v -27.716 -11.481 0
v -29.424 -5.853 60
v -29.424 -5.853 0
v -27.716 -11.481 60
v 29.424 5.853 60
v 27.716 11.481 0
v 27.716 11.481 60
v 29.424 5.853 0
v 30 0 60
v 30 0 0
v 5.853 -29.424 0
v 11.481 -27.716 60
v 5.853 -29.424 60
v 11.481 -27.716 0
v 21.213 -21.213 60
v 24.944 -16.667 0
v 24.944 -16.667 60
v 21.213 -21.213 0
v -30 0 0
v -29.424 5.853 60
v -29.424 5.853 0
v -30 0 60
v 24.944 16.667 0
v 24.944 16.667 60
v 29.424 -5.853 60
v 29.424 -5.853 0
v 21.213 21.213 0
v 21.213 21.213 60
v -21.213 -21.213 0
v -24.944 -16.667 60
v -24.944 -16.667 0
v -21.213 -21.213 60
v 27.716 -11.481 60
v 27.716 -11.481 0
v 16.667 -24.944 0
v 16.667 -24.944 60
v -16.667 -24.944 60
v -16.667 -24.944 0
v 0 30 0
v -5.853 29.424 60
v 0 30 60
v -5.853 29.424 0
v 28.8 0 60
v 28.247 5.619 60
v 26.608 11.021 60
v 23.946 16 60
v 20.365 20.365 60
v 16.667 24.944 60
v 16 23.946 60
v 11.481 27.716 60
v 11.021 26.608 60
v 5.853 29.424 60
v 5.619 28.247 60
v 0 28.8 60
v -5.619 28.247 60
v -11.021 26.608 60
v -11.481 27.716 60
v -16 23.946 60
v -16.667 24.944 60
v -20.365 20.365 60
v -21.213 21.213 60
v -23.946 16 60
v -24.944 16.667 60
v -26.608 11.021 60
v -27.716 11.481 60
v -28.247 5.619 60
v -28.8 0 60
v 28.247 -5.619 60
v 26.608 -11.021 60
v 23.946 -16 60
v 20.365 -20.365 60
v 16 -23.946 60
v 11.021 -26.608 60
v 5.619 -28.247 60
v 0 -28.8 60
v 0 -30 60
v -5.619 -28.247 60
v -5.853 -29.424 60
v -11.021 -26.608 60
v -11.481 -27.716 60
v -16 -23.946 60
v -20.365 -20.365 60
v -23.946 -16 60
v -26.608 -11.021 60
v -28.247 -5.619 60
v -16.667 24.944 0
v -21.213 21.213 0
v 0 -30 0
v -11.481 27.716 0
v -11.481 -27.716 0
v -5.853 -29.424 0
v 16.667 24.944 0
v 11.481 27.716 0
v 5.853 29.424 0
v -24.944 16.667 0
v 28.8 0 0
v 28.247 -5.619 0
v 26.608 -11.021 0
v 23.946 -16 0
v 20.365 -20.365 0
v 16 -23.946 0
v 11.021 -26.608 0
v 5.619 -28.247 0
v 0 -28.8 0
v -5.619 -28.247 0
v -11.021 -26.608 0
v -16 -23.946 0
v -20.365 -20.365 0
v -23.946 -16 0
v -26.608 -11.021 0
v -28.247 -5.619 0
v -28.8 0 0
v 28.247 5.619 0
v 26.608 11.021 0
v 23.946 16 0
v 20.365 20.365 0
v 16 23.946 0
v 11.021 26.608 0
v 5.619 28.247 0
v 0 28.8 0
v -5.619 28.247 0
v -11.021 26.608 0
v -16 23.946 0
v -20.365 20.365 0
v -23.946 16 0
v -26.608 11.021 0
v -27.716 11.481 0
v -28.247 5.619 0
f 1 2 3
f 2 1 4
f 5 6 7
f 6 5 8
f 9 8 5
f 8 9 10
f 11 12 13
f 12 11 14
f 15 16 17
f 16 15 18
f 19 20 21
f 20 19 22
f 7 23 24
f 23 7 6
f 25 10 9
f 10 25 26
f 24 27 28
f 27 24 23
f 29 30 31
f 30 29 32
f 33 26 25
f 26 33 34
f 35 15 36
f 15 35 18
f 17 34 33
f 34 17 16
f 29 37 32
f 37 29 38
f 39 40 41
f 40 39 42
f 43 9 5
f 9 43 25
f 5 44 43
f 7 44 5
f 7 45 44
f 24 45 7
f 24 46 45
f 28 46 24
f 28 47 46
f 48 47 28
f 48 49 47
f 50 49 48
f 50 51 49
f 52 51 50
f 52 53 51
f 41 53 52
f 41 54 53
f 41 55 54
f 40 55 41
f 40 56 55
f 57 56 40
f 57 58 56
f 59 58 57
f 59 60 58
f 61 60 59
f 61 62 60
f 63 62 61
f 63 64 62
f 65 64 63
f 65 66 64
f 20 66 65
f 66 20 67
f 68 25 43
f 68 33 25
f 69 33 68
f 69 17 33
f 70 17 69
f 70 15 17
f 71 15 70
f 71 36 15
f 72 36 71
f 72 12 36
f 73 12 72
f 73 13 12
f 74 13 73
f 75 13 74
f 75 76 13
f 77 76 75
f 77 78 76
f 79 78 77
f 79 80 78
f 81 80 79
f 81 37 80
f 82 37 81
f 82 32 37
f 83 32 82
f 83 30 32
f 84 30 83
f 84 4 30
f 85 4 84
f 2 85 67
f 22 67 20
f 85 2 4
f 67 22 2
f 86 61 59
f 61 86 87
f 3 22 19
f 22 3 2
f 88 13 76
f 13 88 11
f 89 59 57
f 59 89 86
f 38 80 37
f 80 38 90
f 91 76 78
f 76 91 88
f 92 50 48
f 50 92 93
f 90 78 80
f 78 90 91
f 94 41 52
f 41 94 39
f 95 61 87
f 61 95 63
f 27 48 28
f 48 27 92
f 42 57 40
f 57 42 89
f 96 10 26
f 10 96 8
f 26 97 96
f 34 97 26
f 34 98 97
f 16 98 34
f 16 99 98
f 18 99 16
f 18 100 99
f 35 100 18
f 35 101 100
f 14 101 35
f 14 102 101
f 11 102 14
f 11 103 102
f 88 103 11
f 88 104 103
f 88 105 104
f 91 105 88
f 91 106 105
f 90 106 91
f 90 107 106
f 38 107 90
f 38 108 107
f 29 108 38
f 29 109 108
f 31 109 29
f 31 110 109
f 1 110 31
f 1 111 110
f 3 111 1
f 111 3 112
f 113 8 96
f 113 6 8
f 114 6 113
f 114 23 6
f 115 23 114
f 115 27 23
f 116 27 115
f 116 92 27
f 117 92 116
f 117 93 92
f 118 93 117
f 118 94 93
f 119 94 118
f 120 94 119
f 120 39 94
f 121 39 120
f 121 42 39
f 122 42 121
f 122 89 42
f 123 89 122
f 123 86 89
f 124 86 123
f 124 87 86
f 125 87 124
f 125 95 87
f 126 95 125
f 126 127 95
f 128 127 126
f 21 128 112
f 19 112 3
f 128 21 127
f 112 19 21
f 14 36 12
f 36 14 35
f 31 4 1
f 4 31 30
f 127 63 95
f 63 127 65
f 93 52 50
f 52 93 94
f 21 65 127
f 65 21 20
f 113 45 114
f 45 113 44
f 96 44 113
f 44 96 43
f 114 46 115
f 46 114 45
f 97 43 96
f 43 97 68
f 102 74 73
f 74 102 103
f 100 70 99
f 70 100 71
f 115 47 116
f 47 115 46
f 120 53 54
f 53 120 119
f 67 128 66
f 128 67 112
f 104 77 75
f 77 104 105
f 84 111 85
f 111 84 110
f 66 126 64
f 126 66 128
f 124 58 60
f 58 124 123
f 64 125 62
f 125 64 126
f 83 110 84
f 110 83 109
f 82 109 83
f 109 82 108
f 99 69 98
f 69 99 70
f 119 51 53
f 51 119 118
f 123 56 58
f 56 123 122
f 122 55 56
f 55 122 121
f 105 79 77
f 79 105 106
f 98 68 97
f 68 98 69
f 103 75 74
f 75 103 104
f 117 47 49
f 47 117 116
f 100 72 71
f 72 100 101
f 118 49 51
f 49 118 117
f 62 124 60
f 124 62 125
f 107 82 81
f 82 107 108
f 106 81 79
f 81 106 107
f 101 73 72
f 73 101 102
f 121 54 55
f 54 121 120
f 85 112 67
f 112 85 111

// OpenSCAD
$fn = 32;

// ----------------------------------------------------------------------
// Thin tube: 1.2 mm wall
// ----------------------------------------------------------------------

// --- parameters (mm) ---
tube_od = 60;             // outer diameter
tube_h = 60;              // height, Z
wall = 1.2;               // wall thickness

difference() {
  cylinder(h = tube_h, d = tube_od);
  translate([0, 0, -1]) cylinder(h = tube_h + 2, d = tube_od - 2 * wall);
}
